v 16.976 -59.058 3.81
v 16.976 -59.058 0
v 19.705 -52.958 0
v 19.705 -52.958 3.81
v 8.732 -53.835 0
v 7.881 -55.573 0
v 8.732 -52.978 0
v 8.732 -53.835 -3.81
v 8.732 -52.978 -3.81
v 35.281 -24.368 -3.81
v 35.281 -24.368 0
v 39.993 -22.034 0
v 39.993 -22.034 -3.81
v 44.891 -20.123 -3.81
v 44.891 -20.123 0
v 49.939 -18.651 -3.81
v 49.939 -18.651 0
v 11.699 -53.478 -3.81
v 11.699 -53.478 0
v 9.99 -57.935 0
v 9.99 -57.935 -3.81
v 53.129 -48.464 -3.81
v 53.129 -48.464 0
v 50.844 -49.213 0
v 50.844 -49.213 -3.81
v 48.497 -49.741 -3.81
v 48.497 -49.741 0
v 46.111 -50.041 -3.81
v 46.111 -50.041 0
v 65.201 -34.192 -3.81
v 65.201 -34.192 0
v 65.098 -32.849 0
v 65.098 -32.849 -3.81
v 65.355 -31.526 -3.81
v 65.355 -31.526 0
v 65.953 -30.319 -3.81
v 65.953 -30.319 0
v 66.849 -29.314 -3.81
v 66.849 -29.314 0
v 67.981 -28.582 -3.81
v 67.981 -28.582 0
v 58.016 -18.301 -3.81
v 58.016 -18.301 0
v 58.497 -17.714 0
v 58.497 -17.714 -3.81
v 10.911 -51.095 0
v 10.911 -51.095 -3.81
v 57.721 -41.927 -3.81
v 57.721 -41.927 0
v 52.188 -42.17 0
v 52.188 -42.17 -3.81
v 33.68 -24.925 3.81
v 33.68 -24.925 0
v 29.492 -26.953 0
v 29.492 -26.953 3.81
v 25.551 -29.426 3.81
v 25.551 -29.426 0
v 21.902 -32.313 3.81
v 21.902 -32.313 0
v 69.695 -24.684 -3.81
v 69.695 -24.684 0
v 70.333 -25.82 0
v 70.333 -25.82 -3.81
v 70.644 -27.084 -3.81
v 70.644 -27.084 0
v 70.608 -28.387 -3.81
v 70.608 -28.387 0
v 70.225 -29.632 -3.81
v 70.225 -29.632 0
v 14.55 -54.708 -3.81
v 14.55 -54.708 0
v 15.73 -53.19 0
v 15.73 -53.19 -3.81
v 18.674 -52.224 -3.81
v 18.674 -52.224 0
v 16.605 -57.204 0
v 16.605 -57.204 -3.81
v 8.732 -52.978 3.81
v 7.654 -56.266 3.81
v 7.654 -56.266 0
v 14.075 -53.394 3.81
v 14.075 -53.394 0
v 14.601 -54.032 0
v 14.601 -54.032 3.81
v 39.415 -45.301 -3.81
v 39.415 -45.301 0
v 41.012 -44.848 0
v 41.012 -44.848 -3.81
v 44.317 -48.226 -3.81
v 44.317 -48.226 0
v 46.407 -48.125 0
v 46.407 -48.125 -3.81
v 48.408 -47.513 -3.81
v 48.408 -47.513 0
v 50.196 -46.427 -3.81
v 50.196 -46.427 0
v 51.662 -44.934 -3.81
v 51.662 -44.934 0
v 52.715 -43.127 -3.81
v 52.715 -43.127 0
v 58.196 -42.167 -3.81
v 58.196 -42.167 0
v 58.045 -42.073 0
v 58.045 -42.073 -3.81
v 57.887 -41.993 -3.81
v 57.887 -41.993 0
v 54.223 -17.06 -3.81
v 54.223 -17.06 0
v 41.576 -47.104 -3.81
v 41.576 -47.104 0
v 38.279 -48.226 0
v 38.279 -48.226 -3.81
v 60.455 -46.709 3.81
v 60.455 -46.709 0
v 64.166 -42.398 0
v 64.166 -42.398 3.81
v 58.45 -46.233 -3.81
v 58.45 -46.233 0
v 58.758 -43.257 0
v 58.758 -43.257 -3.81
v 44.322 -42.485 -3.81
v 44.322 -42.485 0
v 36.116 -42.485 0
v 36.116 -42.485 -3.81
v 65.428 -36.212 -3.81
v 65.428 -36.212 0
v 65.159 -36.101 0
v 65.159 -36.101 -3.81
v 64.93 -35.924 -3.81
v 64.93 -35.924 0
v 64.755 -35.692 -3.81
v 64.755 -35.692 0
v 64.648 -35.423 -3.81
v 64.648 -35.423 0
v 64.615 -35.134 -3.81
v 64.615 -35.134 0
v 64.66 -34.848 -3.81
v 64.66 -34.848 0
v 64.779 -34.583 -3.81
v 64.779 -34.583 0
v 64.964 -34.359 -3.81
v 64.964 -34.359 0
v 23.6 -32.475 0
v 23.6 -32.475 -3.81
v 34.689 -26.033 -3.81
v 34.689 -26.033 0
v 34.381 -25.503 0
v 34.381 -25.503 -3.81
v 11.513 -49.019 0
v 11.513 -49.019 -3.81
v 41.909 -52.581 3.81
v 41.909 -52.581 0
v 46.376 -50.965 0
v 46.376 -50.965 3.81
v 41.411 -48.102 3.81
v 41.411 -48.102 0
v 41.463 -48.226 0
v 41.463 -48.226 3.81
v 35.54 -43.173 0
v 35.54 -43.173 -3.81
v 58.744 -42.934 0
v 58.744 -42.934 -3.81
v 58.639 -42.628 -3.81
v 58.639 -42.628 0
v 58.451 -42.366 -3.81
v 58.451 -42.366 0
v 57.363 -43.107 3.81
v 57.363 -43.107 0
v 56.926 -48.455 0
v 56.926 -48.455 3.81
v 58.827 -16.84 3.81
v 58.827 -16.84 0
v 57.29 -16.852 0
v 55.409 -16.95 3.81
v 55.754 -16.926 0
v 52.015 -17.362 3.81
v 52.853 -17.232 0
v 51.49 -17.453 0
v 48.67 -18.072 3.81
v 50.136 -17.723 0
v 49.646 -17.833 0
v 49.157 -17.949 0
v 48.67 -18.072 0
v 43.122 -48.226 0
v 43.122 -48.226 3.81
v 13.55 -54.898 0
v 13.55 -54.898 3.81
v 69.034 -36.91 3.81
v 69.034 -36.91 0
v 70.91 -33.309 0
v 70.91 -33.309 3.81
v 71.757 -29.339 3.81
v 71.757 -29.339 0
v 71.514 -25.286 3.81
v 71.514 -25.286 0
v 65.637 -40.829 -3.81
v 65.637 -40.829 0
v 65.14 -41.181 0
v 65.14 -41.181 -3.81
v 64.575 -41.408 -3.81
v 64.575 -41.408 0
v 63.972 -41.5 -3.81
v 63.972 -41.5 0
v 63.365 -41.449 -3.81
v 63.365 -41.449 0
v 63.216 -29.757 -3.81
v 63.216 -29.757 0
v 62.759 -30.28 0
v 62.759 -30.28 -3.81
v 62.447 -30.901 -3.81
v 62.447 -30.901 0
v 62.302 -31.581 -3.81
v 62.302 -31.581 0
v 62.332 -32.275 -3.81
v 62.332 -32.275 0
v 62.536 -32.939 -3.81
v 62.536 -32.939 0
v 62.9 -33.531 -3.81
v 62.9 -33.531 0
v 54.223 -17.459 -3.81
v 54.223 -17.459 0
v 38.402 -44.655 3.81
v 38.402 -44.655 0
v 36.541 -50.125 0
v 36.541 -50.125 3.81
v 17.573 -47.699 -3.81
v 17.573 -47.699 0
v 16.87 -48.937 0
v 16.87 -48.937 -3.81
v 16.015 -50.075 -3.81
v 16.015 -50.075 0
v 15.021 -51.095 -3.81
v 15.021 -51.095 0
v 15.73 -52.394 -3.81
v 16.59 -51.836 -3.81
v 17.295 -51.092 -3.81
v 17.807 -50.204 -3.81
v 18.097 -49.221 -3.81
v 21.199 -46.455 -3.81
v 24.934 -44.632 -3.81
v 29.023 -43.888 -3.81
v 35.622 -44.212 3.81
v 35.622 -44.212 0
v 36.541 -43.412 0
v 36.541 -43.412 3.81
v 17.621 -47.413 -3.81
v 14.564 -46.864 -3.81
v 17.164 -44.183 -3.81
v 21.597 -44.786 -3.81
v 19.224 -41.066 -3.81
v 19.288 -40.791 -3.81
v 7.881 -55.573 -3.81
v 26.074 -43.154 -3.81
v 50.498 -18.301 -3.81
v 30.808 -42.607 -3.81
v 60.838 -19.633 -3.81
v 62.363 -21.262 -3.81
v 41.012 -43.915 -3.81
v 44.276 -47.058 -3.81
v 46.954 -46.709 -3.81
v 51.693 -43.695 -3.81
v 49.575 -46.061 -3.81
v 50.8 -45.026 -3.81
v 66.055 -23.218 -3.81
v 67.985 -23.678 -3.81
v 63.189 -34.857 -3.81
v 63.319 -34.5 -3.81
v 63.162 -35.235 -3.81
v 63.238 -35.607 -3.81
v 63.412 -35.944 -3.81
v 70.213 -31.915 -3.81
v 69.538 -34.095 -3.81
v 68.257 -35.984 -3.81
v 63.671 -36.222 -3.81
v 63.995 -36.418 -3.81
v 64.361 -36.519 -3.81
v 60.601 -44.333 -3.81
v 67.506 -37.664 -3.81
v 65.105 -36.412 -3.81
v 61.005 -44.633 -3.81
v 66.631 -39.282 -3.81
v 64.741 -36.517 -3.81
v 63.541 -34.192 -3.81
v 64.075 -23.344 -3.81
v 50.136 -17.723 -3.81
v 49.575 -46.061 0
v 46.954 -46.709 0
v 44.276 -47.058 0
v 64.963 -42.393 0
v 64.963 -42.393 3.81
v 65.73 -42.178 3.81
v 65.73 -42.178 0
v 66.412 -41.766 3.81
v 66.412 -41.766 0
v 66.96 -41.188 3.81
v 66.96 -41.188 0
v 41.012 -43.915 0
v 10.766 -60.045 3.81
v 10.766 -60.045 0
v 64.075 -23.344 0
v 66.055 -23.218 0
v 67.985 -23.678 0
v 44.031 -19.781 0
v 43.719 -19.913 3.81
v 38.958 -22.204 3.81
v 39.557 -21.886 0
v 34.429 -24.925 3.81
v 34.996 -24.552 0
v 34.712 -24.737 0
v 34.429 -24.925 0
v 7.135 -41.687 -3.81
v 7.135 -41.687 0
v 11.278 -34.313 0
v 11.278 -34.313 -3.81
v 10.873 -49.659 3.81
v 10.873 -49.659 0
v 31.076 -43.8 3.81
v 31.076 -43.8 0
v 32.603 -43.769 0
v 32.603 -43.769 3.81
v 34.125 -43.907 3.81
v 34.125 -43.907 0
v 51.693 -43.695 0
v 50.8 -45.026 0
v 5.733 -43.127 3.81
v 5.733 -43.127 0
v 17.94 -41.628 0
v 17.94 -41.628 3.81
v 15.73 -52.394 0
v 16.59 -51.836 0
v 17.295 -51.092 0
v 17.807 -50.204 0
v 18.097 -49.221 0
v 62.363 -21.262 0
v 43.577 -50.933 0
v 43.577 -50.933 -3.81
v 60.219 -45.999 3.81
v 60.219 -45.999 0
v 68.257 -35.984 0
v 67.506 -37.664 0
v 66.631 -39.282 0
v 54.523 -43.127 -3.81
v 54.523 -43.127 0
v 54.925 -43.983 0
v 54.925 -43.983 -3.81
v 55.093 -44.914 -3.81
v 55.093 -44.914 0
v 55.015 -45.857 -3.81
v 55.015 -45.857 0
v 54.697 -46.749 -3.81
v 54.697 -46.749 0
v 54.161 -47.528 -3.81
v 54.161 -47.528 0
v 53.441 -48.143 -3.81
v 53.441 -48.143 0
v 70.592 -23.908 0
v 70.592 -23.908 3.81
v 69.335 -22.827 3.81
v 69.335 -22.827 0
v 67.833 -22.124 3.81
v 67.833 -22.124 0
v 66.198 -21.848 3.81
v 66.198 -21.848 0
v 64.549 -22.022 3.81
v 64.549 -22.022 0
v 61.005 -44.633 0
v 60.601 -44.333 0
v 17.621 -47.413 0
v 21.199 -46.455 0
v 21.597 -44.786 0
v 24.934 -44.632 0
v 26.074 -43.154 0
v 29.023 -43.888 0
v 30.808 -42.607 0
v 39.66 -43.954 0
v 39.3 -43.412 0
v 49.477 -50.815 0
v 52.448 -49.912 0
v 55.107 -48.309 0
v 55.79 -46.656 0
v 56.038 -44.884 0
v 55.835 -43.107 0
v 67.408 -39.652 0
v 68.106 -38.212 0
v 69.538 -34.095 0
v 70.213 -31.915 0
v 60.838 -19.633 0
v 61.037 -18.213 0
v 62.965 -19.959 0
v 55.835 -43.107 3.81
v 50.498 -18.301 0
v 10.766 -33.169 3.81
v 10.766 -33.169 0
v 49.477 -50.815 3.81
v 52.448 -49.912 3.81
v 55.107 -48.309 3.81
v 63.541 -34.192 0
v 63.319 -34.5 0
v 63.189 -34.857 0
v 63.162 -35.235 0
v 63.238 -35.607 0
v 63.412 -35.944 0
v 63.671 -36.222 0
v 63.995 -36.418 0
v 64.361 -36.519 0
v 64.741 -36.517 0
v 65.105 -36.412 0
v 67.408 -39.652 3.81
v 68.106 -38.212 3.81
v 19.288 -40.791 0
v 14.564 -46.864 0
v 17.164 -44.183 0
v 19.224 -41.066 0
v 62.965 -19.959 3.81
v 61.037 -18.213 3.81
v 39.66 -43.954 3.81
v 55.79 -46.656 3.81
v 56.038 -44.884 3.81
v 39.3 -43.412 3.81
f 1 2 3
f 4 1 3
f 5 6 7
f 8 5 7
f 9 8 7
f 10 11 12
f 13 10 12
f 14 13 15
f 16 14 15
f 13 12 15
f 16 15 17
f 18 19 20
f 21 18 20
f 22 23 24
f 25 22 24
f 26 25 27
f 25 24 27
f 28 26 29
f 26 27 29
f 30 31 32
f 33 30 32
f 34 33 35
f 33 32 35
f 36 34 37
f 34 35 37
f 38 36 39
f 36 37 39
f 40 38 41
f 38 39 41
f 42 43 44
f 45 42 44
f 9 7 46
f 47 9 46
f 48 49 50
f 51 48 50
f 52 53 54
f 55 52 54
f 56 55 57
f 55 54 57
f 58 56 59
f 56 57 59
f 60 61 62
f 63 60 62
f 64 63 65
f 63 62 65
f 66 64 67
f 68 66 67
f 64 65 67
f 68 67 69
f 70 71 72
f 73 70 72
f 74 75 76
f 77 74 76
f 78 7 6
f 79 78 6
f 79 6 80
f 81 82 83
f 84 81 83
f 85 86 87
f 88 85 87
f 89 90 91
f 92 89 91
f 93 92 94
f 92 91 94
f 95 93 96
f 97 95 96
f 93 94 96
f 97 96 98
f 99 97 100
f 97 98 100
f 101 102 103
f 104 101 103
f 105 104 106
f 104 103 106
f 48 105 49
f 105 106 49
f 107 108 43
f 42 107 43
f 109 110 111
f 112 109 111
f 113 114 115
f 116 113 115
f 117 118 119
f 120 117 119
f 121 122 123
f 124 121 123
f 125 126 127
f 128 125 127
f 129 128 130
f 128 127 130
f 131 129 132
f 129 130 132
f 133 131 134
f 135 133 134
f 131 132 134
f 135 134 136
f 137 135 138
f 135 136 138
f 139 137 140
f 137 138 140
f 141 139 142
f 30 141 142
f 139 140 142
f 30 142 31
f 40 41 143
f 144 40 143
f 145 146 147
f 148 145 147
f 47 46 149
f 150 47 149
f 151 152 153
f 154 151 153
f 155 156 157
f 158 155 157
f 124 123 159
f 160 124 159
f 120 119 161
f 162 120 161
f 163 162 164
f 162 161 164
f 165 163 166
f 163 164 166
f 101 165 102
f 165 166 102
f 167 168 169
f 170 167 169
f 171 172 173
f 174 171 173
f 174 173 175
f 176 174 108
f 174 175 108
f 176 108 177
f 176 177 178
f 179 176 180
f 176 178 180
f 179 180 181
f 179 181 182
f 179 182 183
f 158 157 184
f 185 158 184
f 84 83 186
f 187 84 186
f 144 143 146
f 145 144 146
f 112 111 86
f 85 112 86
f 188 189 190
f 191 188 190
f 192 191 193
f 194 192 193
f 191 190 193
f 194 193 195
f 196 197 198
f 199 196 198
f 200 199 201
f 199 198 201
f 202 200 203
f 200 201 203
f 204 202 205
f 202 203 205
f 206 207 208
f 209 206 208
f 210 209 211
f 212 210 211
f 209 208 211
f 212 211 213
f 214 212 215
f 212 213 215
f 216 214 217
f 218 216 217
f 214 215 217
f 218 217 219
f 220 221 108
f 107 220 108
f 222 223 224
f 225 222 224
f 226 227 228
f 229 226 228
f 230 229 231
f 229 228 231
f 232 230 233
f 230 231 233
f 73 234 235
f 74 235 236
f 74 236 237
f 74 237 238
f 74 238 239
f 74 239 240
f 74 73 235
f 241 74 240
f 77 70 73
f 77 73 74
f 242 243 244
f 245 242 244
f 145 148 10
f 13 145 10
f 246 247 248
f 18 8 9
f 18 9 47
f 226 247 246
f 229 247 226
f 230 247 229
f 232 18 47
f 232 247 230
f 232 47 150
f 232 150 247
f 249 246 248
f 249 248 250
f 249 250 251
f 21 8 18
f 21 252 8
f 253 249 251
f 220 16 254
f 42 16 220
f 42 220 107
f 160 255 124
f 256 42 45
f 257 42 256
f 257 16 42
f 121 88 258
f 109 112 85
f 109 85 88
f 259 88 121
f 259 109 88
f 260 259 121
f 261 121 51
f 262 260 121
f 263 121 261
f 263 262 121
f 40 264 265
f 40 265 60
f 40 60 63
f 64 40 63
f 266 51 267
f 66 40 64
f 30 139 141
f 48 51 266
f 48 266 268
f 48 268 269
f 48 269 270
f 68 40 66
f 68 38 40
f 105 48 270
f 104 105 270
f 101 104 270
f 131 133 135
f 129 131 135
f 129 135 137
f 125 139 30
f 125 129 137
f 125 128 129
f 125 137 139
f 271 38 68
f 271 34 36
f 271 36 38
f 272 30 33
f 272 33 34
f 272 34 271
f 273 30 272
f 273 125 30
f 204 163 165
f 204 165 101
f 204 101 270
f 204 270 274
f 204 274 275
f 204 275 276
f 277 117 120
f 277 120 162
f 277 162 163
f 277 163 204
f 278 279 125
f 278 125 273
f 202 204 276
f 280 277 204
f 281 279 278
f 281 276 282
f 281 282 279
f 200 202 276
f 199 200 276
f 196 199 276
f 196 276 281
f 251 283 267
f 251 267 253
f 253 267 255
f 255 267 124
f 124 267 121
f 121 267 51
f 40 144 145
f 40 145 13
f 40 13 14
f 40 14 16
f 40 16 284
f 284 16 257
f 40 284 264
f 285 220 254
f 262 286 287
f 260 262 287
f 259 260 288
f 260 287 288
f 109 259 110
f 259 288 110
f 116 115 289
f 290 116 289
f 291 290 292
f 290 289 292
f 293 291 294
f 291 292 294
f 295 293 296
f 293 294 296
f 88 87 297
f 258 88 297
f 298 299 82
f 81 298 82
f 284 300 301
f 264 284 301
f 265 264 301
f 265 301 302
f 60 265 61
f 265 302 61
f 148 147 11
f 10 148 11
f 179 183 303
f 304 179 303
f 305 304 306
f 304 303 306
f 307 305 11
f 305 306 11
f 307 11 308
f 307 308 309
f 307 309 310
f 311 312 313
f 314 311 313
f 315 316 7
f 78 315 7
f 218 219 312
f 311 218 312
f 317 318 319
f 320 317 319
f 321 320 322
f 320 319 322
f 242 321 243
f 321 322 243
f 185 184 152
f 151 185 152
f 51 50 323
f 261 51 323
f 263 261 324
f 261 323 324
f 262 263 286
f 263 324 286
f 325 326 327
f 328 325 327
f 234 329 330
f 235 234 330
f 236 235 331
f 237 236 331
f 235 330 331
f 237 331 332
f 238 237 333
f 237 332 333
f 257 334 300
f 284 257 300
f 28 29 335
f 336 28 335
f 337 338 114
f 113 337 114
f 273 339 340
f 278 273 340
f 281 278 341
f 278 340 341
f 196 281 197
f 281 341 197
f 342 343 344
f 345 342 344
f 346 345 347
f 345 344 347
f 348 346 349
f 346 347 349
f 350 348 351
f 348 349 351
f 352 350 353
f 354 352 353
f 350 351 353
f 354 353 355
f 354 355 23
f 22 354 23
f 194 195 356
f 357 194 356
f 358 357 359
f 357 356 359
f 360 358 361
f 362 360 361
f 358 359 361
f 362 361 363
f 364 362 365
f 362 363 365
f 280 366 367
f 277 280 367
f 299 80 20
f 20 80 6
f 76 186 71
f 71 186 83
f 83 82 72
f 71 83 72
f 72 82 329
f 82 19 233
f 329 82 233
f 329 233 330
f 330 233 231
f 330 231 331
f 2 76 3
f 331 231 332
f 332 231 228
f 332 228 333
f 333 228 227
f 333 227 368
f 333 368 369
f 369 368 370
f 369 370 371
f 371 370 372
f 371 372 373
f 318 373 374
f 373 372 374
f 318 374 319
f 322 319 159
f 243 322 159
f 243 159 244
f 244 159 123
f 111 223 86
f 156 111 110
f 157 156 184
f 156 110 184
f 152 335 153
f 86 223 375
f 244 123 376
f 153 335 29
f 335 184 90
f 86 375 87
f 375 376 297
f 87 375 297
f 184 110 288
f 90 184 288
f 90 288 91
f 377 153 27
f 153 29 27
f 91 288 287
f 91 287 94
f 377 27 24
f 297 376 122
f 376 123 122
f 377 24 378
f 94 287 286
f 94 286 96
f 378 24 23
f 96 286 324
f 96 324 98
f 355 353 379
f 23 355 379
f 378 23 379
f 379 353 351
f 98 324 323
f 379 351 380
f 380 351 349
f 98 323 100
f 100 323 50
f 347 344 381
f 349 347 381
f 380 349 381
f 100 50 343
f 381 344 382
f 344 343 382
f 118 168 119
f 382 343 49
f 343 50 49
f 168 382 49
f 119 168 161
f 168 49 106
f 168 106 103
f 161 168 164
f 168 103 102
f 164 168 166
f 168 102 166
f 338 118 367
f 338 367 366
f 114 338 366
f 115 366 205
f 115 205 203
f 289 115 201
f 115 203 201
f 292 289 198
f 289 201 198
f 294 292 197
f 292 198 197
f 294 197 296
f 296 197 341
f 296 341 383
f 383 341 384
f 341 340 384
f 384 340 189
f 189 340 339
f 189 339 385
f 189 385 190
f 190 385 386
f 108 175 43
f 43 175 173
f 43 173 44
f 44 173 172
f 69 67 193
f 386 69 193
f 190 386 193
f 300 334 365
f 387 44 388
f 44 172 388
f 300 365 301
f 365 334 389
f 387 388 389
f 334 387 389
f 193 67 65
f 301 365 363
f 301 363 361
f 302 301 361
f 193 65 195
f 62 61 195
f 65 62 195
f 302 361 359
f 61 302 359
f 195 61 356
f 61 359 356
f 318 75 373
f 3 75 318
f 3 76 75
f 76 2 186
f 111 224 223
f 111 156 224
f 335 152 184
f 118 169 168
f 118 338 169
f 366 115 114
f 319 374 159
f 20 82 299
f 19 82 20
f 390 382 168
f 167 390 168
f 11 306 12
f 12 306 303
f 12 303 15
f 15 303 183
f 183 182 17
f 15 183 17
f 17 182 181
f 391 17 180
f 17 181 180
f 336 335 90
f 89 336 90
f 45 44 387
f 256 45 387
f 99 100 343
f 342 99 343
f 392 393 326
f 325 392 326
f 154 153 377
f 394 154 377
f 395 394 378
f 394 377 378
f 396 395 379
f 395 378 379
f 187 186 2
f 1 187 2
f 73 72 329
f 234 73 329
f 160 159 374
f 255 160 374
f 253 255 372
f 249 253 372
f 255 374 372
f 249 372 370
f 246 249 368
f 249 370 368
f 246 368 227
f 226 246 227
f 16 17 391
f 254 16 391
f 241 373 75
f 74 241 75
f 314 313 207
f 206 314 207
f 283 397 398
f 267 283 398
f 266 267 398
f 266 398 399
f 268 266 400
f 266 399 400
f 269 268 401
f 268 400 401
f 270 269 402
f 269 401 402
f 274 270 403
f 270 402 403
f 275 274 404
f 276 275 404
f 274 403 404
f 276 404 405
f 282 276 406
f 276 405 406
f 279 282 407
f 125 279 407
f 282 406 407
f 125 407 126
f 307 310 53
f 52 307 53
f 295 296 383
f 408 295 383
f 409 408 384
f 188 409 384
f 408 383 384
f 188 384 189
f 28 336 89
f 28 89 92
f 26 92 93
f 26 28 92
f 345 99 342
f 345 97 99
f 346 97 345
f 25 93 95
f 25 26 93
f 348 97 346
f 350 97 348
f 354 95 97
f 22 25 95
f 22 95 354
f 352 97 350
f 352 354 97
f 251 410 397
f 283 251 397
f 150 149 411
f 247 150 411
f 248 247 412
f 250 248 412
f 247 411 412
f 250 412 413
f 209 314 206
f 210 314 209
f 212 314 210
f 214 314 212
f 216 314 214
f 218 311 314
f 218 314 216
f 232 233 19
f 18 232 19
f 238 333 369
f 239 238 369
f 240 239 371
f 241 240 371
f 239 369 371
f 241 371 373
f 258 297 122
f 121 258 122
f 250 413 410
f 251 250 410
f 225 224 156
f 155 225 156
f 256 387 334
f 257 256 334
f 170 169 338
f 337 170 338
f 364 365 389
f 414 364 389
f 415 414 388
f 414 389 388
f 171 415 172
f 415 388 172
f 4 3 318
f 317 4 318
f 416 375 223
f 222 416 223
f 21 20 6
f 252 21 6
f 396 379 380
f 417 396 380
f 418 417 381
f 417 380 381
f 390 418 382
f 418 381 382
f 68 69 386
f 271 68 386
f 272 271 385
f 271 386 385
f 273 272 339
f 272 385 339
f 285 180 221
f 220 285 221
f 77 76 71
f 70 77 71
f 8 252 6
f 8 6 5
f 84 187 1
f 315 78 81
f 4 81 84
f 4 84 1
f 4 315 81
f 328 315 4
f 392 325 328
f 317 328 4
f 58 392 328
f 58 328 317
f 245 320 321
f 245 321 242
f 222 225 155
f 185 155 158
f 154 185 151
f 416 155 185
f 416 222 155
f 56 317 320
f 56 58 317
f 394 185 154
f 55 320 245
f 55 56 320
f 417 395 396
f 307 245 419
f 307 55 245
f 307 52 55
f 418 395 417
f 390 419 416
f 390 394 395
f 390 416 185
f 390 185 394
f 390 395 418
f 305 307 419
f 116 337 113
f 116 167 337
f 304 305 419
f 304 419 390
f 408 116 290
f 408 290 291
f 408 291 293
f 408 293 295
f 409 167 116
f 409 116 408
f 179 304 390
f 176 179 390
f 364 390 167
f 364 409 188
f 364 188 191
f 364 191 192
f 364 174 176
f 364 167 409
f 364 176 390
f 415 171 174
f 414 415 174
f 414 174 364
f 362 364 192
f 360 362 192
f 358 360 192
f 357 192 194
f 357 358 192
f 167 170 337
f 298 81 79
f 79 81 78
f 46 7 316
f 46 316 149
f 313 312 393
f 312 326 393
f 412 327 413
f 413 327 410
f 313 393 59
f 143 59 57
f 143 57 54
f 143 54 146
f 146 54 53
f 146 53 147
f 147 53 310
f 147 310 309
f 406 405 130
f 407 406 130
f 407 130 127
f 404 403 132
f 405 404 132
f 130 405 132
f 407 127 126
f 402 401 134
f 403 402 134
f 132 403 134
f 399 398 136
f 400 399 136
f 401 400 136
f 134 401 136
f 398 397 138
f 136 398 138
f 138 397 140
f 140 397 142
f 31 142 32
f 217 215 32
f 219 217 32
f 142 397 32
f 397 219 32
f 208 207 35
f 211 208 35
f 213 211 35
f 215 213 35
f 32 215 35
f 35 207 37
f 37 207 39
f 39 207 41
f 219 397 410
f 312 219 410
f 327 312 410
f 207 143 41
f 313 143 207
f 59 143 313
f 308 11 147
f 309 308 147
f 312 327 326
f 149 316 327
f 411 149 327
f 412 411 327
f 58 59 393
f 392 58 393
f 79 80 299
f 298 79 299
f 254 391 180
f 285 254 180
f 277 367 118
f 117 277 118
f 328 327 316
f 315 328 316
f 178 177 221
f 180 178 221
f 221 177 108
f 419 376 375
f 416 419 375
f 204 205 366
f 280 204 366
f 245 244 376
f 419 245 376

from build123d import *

# Parameters (mm, degrees)
F1_DEPTH = 3.81
F3_DEPTH = 3.81
F5_DEPTH = 3.81


with BuildPart() as f1:
    # F0 (on Top) → F1 (new body)
    with BuildSketch(Plane.XY):
        with BuildLine():
            Line((16.97628, -59.058286), (19.705089, -52.957691))
            Line((19.705089, -52.957691), (31.07564, -43.799512))
            ThreePointArc((31.07564, -43.799512), (33.366016, -43.816918), (35.622127, -44.211995))
            Line((35.622127, -44.211995), (36.541499, -43.411601))
            Line((36.541499, -43.411601), (39.299611, -43.411601))
            Line((39.299611, -43.411601), (39.659975, -43.95369))
            Line((39.659975, -43.95369), (38.401872, -44.655453))
            Line((38.401872, -44.655453), (36.541499, -50.125077))
            Line((36.541499, -50.125077), (41.410863, -48.1015))
            Line((41.410863, -48.1015), (41.462618, -48.226037))
            Line((41.462618, -48.226037), (43.122184, -48.226037))
            Line((43.122184, -48.226037), (41.909318, -52.580997))
            Line((41.909318, -52.580997), (46.375882, -50.965246))
            ThreePointArc((46.375882, -50.965246), (50.990398, -50.455311), (55.107314, -48.309434))
            ThreePointArc((55.107314, -48.309434), (55.96993, -45.777959), (55.834934, -43.106958))
            Line((55.834934, -43.106958), (57.362933, -43.106958))
            Line((57.362933, -43.106958), (56.926362, -48.454959))
            Line((56.926362, -48.454959), (60.218841, -45.999244))
            Line((60.218841, -45.999244), (60.455315, -46.708673))
            Line((60.455315, -46.708673), (64.166173, -42.397529))
            ThreePointArc((64.166173, -42.397529), (65.729722, -42.177688), (66.959918, -41.187923))
            ThreePointArc((66.959918, -41.187923), (67.726373, -38.917492), (69.034263, -36.909573))
            ThreePointArc((69.034263, -36.909573), (71.467629, -31.352581), (71.514241, -25.286343))
            ThreePointArc((71.514241, -25.286343), (68.607951, -22.424523), (64.549089, -22.021808))
            ThreePointArc((64.549089, -22.021808), (62.040176, -19.042247), (58.826987, -16.840467))
            ThreePointArc((58.826987, -16.840467), (53.707685, -17.118566), (48.670236, -18.071821))
            ThreePointArc((48.670236, -18.071821), (41.311862, -21.003722), (34.429371, -24.924567))
            Line((34.429371, -24.924567), (33.67985, -24.924567))
            ThreePointArc((33.67985, -24.924567), (27.48786, -28.135727), (21.901691, -32.312687))
            Line((21.901691, -32.312687), (10.765978, -33.169281))
            Line((10.765978, -33.169281), (5.733491, -43.127179))
            Line((5.733491, -43.127179), (17.939948, -41.628141))
            Line((17.939948, -41.628141), (10.873053, -49.658701))
            Line((10.873053, -49.658701), (8.731569, -52.978002))
            Line((8.731569, -52.978002), (7.653544, -56.265509))
            Line((7.653544, -56.265509), (10.765978, -60.044896))
            Line((10.765978, -60.044896), (14.075343, -53.394235))
            Line((14.075343, -53.394235), (14.600779, -54.032265))
            Line((14.600779, -54.032265), (13.549907, -54.897688))
            Line((13.549907, -54.897688), (16.97628, -59.058286))
        make_face()
    extrude(amount=F1_DEPTH)

    # F2 (on face) → F3 (join)
    with BuildSketch(Plane(origin=(0, 0, 0), x_dir=(1, 0, 0), z_dir=(0, 0, -1))):
        with BuildLine():
            Line((62.362719, 21.262165), (64.074621, 23.344252))
            ThreePointArc((64.074621, 23.344252), (67.036734, 23.376149), (69.694884, 24.683576))
            ThreePointArc((69.694884, 24.683576), (70.644255, 27.084462), (70.225157, 29.631993))
            ThreePointArc((70.225157, 29.631993), (69.955998, 33.029778), (68.25655, 35.984311))
            ThreePointArc((68.25655, 35.984311), (67.0841, 38.480973), (65.636583, 40.828876))
            ThreePointArc((65.636583, 40.828876), (64.574593, 41.408491), (63.365407, 41.449059))
            Line((63.365407, 41.449059), (61.005343, 44.63305))
            Line((61.005343, 44.63305), (60.600822, 44.333207))
            Line((60.600822, 44.333207), (58.44954, 46.232879))
            Line((58.44954, 46.232879), (58.757726, 43.257009))
            ThreePointArc((58.757726, 43.257009), (58.639112, 42.628479), (58.195706, 42.167488))
            ThreePointArc((58.195706, 42.167488), (57.966711, 42.031397), (57.721477, 41.927379))
            Line((57.721477, 41.927379), (52.187819, 42.170435))
            ThreePointArc((52.187819, 42.170435), (51.292653, 44.391683), (49.575482, 46.060991))
            ThreePointArc((49.575482, 46.060991), (45.619915, 46.921487), (41.575972, 47.104497))
            Line((41.575972, 47.104497), (38.279213, 48.226037))
            Line((38.279213, 48.226037), (39.414629, 45.300853))
            Line((39.414629, 45.300853), (41.011725, 44.848081))
            Line((41.011725, 44.848081), (41.011725, 43.914717))
            Line((41.011725, 43.914717), (44.32217, 42.485248))
            Line((44.32217, 42.485248), (36.116112, 42.485248))
            Line((36.116112, 42.485248), (35.539597, 43.173272))
            ThreePointArc((35.539597, 43.173272), (26.07418, 43.15441), (17.62064, 47.412593))
            Line((17.62064, 47.412593), (17.572723, 47.698561))
            ThreePointArc((17.572723, 47.698561), (16.460668, 49.519729), (15.021231, 51.094957))
            Line((15.021231, 51.094957), (11.698972, 53.478461))
            Line((11.698972, 53.478461), (9.989955, 57.935085))
            Line((9.989955, 57.935085), (7.880738, 55.572665))
            Line((7.880738, 55.572665), (8.731569, 53.835317))
            Line((8.731569, 53.835317), (8.731569, 52.978002))
            Line((8.731569, 52.978002), (10.910701, 51.094957))
            Line((10.910701, 51.094957), (11.512643, 49.018534))
            ThreePointArc((11.512643, 49.018534), (15.92645, 45.583856), (19.22353, 41.066337))
            Line((19.22353, 41.066337), (19.28794, 40.791228))
            Line((19.28794, 40.791228), (63.54069, 34.192108))
            ThreePointArc((63.54069, 34.192108), (63.531632, 36.09198), (65.42775, 36.21171))
            ThreePointArc((65.42775, 36.21171), (64.621892, 35.279534), (65.201432, 34.192108))
            ThreePointArc((65.201432, 34.192108), (65.613039, 30.902592), (67.980655, 28.582089))
            Line((67.980655, 28.582089), (23.599958, 32.474866))
            Line((23.599958, 32.474866), (34.688797, 26.033277))
            Line((34.688797, 26.033277), (34.380915, 25.503276))
            Line((34.380915, 25.503276), (35.281472, 24.36841))
            ThreePointArc((35.281472, 24.36841), (42.420934, 21.024647), (49.938917, 18.651335))
            Line((49.938917, 18.651335), (50.498281, 18.300841))
            Line((50.498281, 18.300841), (50.135953, 17.722592))
            Line((50.135953, 17.722592), (54.223109, 17.459012))
            Line((54.223109, 17.459012), (54.223109, 17.059586))
            Line((54.223109, 17.059586), (58.015913, 18.300841))
            Line((58.015913, 18.300841), (58.496706, 17.714143))
            Line((58.496706, 17.714143), (60.837945, 19.632767))
            Line((60.837945, 19.632767), (62.362719, 21.262165))
        make_face()
        with BuildLine():
            Line((52.715112, 43.126516), (54.523326, 43.126516))
            ThreePointArc((54.523326, 43.126516), (55.015238, 45.857392), (53.44123, 48.142597))
            Line((53.44123, 48.142597), (53.128958, 48.463933))
            ThreePointArc((53.128958, 48.463933), (49.676827, 49.504967), (46.111207, 50.04099))
            Line((46.111207, 50.04099), (43.576807, 50.933365))
            Line((43.576807, 50.933365), (44.317115, 48.226037))
            ThreePointArc((44.317115, 48.226037), (49.335622, 47.025861), (52.715112, 43.126516))
        make_face()
        with BuildLine():
            Line((18.673604, 52.224013), (16.605122, 57.203803))
            Line((16.605122, 57.203803), (14.549939, 54.708222))
            Line((14.549939, 54.708222), (15.730347, 53.190444))
            Line((15.730347, 53.190444), (15.730347, 52.394051))
            ThreePointArc((15.730347, 52.394051), (17.295057, 51.092122), (18.096911, 49.221195))
            ThreePointArc((18.096911, 49.221195), (23.003501, 45.414789), (29.022919, 43.888368))
            Line((29.022919, 43.888368), (18.673604, 52.224013))
        make_face()
    extrude(amount=F3_DEPTH)

    # F4 (on face) → F5 (join)
    with BuildSketch(Plane(origin=(0, 0, 0), x_dir=(1, 0, 0), z_dir=(0, 0, -1))):
        with BuildLine():
            ThreePointArc((63.215862, 29.757198), (62.30207, 31.580695), (62.900014, 33.530727))
            Line((62.900014, 33.530727), (7.135111, 41.687112))
            Line((7.135111, 41.687112), (11.278112, 34.312829))
            Line((11.278112, 34.312829), (63.215862, 29.757198))
        make_face()
    extrude(amount=F5_DEPTH)


solid = f1.part
